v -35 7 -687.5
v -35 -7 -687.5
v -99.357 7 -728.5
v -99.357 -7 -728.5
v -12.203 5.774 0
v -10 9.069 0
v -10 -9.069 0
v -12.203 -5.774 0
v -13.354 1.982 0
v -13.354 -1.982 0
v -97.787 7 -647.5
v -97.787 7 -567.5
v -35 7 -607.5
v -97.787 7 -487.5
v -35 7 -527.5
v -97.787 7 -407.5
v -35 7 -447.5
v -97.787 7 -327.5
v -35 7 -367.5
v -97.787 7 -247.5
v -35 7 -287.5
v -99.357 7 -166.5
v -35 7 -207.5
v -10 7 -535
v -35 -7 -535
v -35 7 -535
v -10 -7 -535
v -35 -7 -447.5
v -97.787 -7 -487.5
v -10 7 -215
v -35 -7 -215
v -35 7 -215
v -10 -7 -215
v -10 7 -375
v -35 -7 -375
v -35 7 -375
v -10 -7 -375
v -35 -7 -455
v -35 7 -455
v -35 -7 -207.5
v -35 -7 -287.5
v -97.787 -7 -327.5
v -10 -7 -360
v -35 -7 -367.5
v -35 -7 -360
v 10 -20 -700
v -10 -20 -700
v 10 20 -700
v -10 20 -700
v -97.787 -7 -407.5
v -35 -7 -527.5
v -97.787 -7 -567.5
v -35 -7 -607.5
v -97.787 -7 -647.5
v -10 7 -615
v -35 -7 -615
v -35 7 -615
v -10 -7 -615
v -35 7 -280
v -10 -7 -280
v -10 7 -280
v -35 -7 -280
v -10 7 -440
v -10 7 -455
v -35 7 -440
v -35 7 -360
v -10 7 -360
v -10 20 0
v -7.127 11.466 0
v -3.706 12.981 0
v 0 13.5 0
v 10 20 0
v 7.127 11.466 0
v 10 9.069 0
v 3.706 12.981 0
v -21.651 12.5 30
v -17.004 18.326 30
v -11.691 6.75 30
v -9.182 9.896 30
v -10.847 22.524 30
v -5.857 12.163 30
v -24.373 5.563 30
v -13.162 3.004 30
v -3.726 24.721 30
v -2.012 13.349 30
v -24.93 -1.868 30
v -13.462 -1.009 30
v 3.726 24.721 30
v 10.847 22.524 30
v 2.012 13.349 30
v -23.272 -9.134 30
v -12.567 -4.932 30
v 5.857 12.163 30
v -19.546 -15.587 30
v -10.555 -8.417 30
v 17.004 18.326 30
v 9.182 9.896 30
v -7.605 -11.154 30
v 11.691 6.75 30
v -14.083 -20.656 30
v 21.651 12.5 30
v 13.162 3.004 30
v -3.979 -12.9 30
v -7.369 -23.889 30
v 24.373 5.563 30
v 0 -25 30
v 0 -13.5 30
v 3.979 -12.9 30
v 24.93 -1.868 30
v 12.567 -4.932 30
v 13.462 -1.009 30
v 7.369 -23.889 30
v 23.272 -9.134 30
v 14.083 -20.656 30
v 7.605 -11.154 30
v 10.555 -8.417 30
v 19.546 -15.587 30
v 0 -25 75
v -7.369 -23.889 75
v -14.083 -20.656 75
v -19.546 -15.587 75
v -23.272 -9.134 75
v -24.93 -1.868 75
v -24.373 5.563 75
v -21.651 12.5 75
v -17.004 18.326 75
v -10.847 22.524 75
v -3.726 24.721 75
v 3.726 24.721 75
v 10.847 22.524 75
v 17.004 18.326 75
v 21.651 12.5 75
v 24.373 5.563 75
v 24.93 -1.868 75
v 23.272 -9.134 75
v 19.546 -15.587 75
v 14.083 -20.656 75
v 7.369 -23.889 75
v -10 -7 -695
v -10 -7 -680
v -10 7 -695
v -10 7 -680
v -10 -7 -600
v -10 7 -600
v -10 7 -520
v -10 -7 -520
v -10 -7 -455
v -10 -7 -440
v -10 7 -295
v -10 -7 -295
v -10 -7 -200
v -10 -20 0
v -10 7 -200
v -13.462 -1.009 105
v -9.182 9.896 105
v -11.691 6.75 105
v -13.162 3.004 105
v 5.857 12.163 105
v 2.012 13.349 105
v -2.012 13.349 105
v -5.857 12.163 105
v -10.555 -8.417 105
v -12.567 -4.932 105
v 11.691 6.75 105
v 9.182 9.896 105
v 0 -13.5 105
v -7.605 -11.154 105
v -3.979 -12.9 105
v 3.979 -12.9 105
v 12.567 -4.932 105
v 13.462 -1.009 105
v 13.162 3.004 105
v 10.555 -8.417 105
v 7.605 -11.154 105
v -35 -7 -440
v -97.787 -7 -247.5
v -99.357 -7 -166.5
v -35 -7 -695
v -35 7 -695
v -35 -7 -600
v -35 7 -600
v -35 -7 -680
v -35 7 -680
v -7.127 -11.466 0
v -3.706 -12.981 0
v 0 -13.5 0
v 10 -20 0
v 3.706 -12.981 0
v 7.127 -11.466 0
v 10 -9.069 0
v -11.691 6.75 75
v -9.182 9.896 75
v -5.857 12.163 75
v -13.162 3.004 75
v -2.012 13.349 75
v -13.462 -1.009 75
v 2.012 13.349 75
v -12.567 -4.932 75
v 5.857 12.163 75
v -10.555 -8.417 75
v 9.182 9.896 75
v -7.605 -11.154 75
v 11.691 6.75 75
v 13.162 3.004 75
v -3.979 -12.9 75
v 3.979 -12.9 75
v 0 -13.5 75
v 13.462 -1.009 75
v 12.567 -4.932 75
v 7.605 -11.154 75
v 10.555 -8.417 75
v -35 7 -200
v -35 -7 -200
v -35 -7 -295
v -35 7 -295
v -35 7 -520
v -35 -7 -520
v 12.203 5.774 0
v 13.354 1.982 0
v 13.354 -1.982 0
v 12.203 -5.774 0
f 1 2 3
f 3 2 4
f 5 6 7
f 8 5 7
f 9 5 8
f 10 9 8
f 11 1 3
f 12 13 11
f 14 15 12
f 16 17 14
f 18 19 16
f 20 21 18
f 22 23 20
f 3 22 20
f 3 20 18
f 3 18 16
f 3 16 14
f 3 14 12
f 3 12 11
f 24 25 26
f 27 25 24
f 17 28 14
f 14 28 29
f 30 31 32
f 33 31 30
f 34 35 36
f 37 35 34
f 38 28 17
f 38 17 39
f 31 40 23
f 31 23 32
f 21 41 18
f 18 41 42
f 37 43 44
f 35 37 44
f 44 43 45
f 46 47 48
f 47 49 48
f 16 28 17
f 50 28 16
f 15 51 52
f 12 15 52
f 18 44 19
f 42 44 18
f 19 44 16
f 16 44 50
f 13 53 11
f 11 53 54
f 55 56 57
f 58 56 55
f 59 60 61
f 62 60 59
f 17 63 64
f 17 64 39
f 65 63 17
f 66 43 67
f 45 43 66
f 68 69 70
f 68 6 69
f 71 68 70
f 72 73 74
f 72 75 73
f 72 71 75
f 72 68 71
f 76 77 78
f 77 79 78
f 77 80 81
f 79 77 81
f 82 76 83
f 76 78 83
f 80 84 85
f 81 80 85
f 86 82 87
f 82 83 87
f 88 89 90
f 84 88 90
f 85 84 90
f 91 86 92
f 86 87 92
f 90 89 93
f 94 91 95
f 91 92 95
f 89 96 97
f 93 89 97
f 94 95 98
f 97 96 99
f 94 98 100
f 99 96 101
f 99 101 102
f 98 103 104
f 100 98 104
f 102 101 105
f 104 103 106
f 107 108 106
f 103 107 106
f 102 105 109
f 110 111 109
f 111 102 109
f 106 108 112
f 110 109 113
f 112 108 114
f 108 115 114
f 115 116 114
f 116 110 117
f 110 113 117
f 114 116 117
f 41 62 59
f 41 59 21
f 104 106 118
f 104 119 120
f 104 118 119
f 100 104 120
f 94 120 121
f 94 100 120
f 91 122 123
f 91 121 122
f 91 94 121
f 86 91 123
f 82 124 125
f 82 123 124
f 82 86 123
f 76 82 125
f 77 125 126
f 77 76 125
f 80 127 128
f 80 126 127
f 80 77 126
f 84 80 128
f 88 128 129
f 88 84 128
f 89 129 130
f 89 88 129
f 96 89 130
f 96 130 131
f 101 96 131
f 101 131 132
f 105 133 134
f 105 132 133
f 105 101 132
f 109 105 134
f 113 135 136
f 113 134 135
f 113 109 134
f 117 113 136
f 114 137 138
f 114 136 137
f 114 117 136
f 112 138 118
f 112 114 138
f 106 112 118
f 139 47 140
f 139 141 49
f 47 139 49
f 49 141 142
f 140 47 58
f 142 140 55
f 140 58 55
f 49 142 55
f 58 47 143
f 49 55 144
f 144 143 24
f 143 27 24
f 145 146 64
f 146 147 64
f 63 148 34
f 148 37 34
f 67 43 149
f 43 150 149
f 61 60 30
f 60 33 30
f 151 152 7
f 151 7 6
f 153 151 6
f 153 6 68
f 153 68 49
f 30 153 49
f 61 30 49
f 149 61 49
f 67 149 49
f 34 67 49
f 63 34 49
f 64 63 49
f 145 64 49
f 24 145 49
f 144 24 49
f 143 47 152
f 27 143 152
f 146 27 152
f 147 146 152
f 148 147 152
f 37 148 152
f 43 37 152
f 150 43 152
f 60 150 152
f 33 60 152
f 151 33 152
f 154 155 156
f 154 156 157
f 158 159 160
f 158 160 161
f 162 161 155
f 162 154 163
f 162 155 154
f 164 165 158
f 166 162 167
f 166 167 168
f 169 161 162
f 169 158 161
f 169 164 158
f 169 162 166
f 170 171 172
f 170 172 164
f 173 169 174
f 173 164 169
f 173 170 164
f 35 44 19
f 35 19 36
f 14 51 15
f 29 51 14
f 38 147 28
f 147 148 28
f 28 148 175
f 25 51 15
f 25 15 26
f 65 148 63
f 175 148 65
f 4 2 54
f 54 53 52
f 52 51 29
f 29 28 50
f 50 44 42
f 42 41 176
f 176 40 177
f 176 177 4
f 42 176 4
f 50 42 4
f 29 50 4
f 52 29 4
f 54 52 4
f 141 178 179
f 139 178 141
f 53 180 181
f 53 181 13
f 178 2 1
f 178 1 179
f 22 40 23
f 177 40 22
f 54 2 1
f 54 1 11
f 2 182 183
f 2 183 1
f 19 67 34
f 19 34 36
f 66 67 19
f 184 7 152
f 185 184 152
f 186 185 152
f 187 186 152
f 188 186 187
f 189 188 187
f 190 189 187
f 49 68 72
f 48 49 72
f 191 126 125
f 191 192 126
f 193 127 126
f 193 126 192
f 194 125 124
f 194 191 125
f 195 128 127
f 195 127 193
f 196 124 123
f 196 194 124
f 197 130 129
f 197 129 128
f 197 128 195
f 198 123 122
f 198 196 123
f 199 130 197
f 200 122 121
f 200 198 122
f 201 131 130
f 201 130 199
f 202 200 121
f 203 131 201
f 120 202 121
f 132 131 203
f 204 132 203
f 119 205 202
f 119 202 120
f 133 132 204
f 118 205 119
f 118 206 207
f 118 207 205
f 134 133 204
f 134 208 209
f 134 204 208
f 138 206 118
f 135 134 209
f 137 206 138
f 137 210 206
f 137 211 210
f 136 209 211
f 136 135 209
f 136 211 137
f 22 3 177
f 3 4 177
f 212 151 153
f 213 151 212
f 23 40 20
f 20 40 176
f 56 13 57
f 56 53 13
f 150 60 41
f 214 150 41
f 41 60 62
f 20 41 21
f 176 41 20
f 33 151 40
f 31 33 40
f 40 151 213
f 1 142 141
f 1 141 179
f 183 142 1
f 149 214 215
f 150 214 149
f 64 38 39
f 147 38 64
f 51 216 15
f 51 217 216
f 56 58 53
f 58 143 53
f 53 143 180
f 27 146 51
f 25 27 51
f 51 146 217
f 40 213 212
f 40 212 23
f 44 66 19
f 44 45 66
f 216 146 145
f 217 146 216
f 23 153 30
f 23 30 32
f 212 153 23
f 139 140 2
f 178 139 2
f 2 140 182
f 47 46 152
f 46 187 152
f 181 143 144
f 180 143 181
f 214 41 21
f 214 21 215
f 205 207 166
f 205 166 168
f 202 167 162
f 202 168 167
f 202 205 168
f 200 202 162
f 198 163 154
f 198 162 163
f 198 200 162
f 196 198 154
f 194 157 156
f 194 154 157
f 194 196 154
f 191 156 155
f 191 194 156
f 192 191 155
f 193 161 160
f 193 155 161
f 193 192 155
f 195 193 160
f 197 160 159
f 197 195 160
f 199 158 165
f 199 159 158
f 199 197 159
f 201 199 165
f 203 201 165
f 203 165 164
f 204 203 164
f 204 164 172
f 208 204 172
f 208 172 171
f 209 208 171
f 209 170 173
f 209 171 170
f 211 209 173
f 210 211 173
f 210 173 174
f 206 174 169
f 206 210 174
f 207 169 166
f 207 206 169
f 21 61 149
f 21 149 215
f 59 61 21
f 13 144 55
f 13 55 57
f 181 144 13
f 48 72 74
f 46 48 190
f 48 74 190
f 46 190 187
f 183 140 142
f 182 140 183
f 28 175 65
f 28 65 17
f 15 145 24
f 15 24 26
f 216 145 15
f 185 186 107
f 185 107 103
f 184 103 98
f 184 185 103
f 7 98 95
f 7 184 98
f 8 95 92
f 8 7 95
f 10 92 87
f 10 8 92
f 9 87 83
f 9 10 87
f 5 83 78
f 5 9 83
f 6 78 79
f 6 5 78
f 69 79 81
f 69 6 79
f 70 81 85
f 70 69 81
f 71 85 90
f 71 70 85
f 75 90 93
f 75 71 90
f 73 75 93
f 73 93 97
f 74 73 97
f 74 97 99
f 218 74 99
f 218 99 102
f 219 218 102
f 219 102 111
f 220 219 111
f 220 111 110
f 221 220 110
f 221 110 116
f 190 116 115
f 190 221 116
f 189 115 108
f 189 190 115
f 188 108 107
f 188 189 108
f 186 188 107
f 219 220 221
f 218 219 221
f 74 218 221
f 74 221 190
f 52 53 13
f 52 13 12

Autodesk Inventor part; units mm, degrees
ref_plane "YZ Plane" through (0, 0, 0) normal (1, 0, 0) x (0, 1, 0)
ref_plane "XZ Plane" through (0, 0, 0) normal (0, 1, 0) x (-1, 0, 0)
ref_plane "XY Plane" through (0, 0, 0) normal (0, 0, 1) x (1, 0, 0)
sketch "Sketch2" plane through (0, 0, 0) normal (0, 0, 1) x (1, 0, 0)
  line L0 (-10, 20) -> (10, 20)
  line L1 (10, 20) -> (10, -20)
  line L2 (10, -20) -> (-10, -20)
  line L3 (-10, -20) -> (-10, 20)
  line L4 (-10, 20) -> (10, -20) construction
  line L5 (10, 20) -> (-10, -20) construction
  point P0 (0, 0)
  dimension "d8" = 20
  dimension "d9" = 40
extrude "Extrusion2" add sketch "Sketch2" against normal blind 700
sketch "Sketch3" plane through (0, 0, 0) normal (0, 1, 0) x (-1, 0, 0)
  line L0 (10, 0) -> (-10, 0) construction
  line L1 (10, 0) -> (10, -700) construction
  line L2 (-10, -700) -> (10, -700) construction
  line L3 (-10, 0) -> (-10, -700) construction
  line L4 (10, -680) -> (35, -680)
  line L5 (35, -680) -> (35, -695)
  line L6 (35, -695) -> (10, -695)
  line L7 (10, -695) -> (10, -680)
  line L8 (35, -687.5) -> (99.3571, -687.5)
  line L9 (35, -687.5) -> (99.3571, -646.5)
  line L10 (35, -687.5) -> (99.3571, -728.5)
  line L11 (99.3571, -728.5) -> (99.3571, -646.5)
  point P0 (0, 0)
  dimension "d21" = 25
  dimension "d22" = 15
  dimension "d23" = 5
  dimension "d24" = 65
  dimension "d25" = 82
  dimension "d26" = 64.3571
  dimension "d27" = 109.3571
extrude "Extrusion3" add sketch "Sketch3" along normal mid plane 14
pattern_linear "Rectangular Pattern1" count 7 spacing 80 along (0, 0, 1) of "Extrusion3"
sketch "Sketch4" plane through (0, 0, 0) normal (1, 0, 0) x (0, 1, 0)
  line L0 (0, 0) -> (0, 105)
  line L1 (0, 105) -> (-13.5, 105)
  line L2 (-13.5, 105) -> (-13.5, 75)
  line L3 (-13.5, 75) -> (-25, 75)
  line L4 (-25, 75) -> (-25, 30)
  line L5 (-25, 30) -> (-13.5, 30)
  line L6 (-13.5, 30) -> (-13.5, 0)
  line L7 (-7, -200) -> (-7, -215) projected
  line L8 (-7, -215) -> (7, -215) projected
  line L9 (7, -215) -> (7, -200) projected
  line L10 (7, -200) -> (-7, -200) projected
  line L11 (-7, -280) -> (-7, -295) projected
  line L12 (-7, -295) -> (7, -295) projected
  line L13 (7, -295) -> (7, -280) projected
  line L14 (7, -280) -> (-7, -280) projected
  line L15 (-7, -360) -> (-7, -375) projected
  line L16 (-7, -375) -> (7, -375) projected
  line L17 (7, -375) -> (7, -360) projected
  line L18 (7, -360) -> (-7, -360) projected
  line L19 (-7, -440) -> (-7, -455) projected
  line L20 (-7, -455) -> (7, -455) projected
  line L21 (7, -455) -> (7, -440) projected
  line L22 (7, -440) -> (-7, -440) projected
  line L23 (-7, -520) -> (-7, -535) projected
  line L24 (-7, -535) -> (7, -535) projected
  line L25 (7, -535) -> (7, -520) projected
  line L26 (7, -520) -> (-7, -520) projected
  line L27 (-7, -600) -> (-7, -615) projected
  line L28 (-7, -615) -> (7, -615) projected
  line L29 (7, -615) -> (7, -600) projected
  line L30 (7, -600) -> (-7, -600) projected
  line L31 (-7, -680) -> (-7, -695) projected
  line L32 (-7, -695) -> (7, -695) projected
  line L33 (7, -695) -> (7, -680) projected
  line L34 (7, -680) -> (-7, -680) projected
  line L35 (20, 0) -> (-20, 0) projected
  line L36 (20, 0) -> (20, -700) projected
  line L37 (-20, -700) -> (20, -700) projected
  line L38 (-20, 0) -> (-20, -700) projected
  dimension "d29" = 30
  dimension "d30" = 30
  dimension "d31" = 50
  dimension "d32" = 27
  dimension "d34" = 45
revolve "Revolution1" add sketch "Sketch4" angle 360 about axis through (0, 0, 0) along (0, 0, 1) contours L35 L6 L5 L4 L3 L2 L1 L0
properties part number "ДМФ 081 труба форсунки v2.0"
